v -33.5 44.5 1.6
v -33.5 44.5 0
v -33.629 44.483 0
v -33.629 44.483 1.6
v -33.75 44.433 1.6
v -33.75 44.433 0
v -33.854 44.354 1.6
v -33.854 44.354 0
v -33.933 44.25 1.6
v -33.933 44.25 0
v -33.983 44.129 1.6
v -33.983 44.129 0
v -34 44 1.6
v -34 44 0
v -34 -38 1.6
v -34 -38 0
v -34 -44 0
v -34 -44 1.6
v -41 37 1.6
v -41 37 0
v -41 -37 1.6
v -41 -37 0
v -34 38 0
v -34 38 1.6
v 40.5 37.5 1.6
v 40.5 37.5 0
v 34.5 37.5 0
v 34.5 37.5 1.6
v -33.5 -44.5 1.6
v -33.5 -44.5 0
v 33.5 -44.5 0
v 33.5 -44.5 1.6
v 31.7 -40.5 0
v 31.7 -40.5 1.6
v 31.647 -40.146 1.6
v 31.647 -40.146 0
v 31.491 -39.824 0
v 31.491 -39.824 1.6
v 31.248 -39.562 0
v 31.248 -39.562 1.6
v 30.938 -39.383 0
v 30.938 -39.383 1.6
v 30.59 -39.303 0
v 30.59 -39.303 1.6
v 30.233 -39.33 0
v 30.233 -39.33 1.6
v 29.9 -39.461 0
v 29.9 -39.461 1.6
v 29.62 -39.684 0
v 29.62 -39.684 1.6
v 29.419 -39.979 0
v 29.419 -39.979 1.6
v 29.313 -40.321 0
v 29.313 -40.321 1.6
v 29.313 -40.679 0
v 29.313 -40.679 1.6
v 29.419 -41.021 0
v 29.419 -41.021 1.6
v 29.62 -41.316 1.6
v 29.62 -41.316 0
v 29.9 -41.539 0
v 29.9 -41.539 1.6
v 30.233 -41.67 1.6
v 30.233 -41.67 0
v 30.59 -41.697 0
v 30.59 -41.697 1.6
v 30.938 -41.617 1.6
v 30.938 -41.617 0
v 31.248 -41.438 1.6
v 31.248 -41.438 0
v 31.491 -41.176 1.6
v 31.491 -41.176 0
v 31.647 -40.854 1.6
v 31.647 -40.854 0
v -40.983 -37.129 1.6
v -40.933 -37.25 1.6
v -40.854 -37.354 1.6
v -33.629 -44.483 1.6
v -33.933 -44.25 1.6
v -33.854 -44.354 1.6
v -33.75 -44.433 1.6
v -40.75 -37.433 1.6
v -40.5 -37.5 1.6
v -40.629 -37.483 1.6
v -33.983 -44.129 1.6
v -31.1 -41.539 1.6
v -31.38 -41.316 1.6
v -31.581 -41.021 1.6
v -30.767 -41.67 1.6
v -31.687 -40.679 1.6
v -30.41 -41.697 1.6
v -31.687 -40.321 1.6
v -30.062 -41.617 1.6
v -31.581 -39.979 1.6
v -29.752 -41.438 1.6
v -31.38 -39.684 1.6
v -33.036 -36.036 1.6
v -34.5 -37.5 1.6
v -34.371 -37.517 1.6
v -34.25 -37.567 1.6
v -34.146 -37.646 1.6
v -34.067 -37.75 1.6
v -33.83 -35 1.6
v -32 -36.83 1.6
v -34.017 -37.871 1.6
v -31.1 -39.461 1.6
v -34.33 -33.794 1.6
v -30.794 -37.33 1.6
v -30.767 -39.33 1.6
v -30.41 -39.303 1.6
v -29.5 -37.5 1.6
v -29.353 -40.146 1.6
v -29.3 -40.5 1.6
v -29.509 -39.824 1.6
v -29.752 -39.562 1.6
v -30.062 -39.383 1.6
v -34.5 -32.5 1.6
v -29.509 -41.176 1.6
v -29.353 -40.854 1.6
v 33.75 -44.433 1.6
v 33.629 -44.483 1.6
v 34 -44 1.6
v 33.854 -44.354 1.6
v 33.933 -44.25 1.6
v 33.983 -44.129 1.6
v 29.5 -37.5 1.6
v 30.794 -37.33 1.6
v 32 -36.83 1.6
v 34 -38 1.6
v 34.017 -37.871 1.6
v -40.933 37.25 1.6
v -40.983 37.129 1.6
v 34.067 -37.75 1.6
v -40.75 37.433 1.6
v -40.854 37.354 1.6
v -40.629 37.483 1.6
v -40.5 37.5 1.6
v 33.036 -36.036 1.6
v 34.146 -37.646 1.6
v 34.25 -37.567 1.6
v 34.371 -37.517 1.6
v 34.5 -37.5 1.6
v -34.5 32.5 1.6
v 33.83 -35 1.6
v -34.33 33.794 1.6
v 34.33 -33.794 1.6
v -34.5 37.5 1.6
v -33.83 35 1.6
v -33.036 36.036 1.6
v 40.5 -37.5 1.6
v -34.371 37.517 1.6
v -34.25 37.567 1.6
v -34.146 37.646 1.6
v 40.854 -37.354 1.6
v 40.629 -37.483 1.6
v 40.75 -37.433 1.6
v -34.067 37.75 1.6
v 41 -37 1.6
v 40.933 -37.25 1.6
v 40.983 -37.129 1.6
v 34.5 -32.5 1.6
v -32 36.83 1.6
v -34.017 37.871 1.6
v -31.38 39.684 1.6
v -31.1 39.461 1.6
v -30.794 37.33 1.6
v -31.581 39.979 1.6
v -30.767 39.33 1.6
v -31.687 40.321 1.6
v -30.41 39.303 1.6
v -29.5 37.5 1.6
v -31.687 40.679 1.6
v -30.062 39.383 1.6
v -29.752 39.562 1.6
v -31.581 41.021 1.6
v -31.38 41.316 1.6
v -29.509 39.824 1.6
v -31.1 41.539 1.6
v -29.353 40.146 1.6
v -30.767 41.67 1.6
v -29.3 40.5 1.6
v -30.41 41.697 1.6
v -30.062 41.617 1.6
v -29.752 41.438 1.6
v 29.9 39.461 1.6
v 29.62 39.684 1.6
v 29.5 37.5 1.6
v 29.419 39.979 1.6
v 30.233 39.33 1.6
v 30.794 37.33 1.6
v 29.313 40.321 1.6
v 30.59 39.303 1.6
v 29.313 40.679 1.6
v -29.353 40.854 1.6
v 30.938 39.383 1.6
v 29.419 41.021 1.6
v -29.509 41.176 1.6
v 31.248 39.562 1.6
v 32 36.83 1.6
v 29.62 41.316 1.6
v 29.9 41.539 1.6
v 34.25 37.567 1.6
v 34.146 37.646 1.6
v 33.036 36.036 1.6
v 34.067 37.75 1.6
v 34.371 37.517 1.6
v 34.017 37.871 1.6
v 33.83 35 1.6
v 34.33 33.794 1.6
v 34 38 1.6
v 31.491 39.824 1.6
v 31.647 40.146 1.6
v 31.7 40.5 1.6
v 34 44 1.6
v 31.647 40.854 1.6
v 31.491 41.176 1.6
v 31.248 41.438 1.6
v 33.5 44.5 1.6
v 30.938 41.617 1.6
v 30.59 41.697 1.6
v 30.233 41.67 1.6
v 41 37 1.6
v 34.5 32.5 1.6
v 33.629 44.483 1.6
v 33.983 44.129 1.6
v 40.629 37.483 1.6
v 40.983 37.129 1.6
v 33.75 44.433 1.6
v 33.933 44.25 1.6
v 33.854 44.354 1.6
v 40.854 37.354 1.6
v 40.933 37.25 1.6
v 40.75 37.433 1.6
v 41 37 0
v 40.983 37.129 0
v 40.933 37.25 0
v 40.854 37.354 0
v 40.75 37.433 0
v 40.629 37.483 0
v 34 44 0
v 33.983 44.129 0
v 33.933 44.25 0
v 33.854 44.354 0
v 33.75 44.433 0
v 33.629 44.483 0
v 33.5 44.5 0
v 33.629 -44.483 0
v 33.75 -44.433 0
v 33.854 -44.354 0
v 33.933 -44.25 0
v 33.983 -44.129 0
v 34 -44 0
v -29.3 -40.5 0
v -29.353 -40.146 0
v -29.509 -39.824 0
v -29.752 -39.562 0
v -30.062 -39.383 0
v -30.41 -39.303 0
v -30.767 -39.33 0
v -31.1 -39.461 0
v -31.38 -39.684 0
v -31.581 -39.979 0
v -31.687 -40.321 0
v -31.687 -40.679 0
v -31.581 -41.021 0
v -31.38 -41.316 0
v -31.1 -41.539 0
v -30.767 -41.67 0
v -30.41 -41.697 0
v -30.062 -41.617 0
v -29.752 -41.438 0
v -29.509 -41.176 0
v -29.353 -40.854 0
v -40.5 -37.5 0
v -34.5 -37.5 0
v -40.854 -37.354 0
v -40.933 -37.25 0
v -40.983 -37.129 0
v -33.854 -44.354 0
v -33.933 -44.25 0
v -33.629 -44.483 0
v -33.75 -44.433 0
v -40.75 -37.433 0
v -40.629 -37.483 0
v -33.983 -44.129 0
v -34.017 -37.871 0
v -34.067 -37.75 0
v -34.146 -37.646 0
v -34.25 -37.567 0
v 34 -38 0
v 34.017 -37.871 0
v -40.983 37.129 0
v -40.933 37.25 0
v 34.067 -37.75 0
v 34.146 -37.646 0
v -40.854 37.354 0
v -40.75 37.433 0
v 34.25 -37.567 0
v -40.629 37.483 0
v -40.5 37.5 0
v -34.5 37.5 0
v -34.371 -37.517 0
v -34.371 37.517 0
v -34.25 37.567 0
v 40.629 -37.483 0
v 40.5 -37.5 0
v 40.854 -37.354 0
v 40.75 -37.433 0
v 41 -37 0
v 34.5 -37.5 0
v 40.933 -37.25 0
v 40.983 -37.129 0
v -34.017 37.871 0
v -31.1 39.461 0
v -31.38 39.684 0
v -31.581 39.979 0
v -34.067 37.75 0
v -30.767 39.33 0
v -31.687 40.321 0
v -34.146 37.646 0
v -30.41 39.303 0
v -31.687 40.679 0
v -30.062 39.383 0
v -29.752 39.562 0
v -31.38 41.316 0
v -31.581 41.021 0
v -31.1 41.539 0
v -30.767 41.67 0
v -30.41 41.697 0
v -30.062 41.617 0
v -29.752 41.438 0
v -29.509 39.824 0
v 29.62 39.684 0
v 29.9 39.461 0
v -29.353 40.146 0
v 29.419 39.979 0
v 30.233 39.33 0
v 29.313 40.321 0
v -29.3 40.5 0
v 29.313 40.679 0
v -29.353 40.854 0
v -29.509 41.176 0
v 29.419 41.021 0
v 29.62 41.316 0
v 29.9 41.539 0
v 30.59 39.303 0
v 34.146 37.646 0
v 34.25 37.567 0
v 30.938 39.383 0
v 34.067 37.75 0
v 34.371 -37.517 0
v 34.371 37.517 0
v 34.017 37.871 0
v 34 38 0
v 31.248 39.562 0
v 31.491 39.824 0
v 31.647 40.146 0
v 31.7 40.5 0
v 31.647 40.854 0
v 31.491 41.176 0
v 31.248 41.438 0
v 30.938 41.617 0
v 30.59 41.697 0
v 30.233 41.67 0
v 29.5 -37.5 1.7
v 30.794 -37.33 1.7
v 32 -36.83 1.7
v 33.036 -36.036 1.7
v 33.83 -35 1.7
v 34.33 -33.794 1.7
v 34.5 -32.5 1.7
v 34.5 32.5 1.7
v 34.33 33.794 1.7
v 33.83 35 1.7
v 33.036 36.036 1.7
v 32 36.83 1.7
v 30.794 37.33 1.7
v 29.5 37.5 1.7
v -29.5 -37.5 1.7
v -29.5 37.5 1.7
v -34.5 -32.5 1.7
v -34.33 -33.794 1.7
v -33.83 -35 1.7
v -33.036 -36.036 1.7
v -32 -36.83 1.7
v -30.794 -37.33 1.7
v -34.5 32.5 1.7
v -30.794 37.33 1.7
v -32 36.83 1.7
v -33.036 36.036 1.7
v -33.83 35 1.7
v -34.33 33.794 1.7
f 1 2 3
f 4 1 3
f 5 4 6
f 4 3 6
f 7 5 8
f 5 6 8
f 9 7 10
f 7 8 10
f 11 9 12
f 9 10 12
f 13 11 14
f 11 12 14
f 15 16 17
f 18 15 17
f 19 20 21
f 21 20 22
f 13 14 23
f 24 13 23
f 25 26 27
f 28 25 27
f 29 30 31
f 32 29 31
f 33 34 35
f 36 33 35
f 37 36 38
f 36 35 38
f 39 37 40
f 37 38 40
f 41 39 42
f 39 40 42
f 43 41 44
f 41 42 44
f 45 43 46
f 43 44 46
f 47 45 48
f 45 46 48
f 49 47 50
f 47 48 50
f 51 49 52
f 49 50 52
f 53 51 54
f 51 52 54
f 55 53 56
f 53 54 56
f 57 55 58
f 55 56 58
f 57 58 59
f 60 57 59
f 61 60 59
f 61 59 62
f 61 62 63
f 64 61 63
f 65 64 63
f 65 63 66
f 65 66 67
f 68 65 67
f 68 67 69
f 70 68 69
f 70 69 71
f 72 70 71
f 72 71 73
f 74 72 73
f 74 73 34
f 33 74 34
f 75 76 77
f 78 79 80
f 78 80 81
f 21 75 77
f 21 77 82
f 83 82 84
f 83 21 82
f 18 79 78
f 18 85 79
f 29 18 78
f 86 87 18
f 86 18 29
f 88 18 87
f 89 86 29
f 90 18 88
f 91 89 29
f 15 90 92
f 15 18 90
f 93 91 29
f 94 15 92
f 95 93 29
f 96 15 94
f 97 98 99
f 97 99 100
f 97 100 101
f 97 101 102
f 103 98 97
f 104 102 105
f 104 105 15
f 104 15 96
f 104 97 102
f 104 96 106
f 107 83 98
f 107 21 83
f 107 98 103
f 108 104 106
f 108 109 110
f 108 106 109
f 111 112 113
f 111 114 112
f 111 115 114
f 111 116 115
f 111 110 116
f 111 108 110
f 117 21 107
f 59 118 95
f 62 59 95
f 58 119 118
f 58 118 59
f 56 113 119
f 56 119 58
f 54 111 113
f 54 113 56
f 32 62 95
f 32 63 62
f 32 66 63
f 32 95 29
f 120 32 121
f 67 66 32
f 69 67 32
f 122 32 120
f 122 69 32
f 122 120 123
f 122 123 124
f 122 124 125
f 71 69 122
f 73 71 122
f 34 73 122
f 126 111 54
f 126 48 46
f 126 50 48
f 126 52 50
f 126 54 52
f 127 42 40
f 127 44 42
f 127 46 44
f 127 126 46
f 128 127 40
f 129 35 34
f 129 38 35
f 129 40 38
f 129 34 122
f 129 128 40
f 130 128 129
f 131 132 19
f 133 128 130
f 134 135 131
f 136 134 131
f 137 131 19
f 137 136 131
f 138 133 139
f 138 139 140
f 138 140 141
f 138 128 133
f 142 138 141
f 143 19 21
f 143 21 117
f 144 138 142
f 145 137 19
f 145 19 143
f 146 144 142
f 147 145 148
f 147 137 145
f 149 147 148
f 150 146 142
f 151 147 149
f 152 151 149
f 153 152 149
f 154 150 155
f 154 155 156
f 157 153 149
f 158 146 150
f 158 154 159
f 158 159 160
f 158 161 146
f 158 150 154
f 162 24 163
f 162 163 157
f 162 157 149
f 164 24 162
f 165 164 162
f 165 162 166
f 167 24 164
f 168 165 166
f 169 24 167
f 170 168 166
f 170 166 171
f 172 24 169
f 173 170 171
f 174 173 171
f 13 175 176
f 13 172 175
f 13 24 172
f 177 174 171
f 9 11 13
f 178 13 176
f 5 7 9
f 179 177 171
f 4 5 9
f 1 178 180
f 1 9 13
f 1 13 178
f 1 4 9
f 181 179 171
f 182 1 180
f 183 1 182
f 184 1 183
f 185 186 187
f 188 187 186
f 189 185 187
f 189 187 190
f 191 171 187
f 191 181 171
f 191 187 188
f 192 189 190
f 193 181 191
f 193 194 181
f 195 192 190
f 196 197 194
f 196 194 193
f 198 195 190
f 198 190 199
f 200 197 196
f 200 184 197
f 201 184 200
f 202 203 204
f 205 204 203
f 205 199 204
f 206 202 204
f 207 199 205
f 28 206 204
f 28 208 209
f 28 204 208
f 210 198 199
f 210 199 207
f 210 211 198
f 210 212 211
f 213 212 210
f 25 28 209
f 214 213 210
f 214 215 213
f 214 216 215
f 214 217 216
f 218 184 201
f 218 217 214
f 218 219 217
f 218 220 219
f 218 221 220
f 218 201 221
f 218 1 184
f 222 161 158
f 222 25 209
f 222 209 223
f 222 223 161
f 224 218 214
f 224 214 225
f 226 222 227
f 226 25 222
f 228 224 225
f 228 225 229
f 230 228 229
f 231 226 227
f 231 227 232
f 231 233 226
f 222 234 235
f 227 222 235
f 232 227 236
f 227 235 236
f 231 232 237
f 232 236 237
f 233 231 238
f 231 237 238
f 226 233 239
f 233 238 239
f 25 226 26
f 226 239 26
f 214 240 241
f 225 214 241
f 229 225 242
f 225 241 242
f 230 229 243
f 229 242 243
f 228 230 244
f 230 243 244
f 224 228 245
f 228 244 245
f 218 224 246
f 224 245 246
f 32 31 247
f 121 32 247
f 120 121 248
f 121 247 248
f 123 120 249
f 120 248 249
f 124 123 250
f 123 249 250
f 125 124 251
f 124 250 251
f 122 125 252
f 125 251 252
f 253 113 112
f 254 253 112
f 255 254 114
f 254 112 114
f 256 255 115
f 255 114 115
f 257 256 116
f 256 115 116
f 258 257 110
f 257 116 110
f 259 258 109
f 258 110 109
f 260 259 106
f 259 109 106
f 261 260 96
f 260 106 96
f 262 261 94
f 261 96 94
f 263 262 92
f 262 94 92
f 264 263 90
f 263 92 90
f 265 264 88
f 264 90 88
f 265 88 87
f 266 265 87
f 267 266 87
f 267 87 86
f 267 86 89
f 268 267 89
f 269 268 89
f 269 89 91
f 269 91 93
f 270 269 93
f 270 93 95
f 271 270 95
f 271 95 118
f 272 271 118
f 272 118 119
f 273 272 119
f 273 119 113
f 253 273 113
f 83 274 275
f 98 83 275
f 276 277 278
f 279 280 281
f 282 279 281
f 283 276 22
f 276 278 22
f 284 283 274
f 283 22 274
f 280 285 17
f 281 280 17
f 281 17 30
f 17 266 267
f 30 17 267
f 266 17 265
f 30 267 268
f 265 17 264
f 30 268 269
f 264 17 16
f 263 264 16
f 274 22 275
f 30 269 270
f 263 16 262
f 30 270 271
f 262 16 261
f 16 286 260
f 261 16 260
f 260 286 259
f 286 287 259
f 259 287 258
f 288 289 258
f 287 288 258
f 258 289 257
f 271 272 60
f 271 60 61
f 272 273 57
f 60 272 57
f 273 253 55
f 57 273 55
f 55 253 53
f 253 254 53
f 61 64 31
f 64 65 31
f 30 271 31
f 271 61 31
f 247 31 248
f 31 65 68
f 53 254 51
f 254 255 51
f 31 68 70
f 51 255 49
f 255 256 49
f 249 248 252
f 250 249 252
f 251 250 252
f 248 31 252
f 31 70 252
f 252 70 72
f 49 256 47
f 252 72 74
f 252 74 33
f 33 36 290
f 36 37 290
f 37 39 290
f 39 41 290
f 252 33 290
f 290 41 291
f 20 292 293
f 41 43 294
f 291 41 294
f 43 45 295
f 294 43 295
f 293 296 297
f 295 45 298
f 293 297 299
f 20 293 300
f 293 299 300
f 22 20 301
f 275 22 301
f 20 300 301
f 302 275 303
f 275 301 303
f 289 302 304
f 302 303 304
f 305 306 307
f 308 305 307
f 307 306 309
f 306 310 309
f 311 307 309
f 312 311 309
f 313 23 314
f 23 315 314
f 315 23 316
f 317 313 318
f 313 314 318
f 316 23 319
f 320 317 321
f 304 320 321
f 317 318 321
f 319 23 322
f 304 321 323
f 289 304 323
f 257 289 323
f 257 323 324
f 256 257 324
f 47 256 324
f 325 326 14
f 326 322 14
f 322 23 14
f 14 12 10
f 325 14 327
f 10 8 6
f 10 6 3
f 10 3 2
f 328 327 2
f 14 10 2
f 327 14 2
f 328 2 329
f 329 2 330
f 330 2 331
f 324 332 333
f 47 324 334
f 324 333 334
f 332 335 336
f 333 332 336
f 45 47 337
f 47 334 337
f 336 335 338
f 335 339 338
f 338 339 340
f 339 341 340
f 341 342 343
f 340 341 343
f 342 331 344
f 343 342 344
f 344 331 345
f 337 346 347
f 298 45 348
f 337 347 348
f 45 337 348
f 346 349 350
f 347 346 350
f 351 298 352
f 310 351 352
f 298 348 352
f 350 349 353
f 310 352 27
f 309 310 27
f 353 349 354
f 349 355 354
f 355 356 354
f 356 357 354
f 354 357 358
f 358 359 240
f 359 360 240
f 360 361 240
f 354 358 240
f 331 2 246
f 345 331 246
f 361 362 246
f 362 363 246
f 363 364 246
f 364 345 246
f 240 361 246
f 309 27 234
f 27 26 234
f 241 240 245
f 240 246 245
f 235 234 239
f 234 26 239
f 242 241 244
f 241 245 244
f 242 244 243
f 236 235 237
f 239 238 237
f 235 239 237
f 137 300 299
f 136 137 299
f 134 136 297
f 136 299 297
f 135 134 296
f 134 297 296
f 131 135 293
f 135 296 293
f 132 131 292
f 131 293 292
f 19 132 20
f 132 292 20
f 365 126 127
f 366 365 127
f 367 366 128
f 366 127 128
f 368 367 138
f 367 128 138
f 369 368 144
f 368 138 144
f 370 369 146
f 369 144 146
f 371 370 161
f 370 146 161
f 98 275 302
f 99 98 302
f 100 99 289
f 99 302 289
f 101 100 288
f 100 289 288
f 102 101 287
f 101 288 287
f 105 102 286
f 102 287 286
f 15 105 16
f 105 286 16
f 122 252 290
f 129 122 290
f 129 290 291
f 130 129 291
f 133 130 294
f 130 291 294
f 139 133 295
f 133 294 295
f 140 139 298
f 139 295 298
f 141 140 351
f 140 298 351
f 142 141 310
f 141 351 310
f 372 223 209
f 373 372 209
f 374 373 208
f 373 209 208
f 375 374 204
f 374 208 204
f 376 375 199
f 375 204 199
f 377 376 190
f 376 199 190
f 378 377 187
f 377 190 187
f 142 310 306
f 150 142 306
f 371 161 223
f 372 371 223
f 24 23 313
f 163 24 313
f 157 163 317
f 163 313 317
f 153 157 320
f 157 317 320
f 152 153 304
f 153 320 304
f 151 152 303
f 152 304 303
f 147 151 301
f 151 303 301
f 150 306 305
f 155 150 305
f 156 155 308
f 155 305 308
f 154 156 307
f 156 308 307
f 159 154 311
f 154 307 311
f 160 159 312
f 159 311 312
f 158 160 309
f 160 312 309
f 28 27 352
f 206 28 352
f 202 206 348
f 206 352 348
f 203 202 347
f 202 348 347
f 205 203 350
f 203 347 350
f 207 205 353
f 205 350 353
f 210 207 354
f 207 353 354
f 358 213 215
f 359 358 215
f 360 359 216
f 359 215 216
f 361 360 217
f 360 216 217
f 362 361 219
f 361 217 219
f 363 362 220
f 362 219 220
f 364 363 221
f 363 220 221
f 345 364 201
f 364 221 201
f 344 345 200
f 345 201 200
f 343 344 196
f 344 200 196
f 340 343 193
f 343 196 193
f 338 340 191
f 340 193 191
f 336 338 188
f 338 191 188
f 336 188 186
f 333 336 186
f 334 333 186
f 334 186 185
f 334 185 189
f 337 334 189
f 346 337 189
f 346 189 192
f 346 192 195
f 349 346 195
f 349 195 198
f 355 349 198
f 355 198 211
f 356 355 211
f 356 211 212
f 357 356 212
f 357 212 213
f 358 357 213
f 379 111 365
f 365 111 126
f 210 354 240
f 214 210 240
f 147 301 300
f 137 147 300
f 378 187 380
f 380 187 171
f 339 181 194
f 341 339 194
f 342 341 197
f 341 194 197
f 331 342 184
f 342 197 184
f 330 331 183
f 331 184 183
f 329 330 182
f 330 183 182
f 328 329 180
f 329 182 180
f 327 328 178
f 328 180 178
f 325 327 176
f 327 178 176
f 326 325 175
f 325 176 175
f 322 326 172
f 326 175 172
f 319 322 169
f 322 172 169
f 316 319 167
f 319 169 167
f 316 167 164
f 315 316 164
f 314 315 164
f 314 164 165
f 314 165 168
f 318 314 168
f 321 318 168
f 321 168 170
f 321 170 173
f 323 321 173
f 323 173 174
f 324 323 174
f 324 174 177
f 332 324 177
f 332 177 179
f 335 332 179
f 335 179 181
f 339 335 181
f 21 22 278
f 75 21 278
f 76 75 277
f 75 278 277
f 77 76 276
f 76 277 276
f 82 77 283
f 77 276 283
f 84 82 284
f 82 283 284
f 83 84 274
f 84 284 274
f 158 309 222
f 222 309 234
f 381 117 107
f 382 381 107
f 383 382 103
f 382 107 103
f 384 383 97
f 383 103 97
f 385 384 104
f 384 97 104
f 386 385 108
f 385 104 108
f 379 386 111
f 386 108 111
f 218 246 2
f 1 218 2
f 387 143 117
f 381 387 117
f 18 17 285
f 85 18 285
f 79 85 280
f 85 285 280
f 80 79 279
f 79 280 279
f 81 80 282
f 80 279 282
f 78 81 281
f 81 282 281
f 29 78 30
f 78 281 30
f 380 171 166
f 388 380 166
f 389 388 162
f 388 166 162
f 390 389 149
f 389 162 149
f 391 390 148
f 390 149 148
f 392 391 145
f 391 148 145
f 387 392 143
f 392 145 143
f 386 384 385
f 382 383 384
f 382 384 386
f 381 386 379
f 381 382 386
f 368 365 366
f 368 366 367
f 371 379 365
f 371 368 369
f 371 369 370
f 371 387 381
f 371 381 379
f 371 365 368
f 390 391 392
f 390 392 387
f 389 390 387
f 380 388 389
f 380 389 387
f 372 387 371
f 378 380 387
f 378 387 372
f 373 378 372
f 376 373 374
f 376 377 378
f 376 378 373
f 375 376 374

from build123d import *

# Parameters (mm, degrees)
BOSS_EXTRUDE1_DEPTH            = 1.6
BOSS_EXTRUDE2_DEPTH            = 0.1
M2_HOLE1_FIXINGSTRUCTURE_D     = 2.4
M2_HOLE1_FIXINGSTRUCTURE_DEPTH = 200
M2_HOLE1_FIXINGSTRUCTURE_TIP   = 0.721032743


with BuildPart() as part:
    # Sketch1 → Boss-Extrude1 (new body)
    with BuildSketch(Plane.XY):
        with BuildLine():
            Line((-34, 44), (-34, 38))
            ThreePointArc((-34, 38), (-34.146446609, 37.646446609), (-34.5, 37.5))
            Line((-34.5, 37.5), (-40.5, 37.5))
            ThreePointArc((-40.5, 37.5), (-40.853553391, 37.353553391), (-41, 37))
            Line((-41, 37), (-41, -37))
            ThreePointArc((-41, -37), (-40.853553391, -37.353553391), (-40.5, -37.5))
            Line((-40.5, -37.5), (-34.5, -37.5))
            ThreePointArc((-34.5, -37.5), (-34.146446609, -37.646446609), (-34, -38))
            Line((-34, -38), (-34, -44))
            ThreePointArc((-34, -44), (-33.853553391, -44.353553391), (-33.5, -44.5))
            Line((-33.5, -44.5), (33.5, -44.5))
            ThreePointArc((33.5, -44.5), (33.853553391, -44.353553391), (34, -44))
            Line((34, -44), (34, -38))
            ThreePointArc((34, -38), (34.146446609, -37.646446609), (34.5, -37.5))
            Line((34.5, -37.5), (40.5, -37.5))
            ThreePointArc((40.5, -37.5), (40.853553391, -37.353553391), (41, -37))
            Line((41, -37), (41, 37))
            ThreePointArc((41, 37), (40.853553391, 37.353553391), (40.5, 37.5))
            Line((40.5, 37.5), (34.5, 37.5))
            ThreePointArc((34.5, 37.5), (34.146446609, 37.646446609), (34, 38))
            Line((34, 38), (34, 44))
            ThreePointArc((34, 44), (33.853553391, 44.353553391), (33.5, 44.5))
            Line((33.5, 44.5), (-33.5, 44.5))
            ThreePointArc((-33.5, 44.5), (-33.853553391, 44.353553391), (-34, 44))
        make_face()
    extrude(amount=BOSS_EXTRUDE1_DEPTH)

    # Esboço1 → Boss-Extrude2 (add)
    with BuildSketch(Plane.XY.offset(1.6)):
        with BuildLine():
            Line((-29.5, -37.5), (29.5, -37.5))
            ThreePointArc((29.5, -37.5), (33.035533906, -36.035533906), (34.5, -32.5))
            Line((34.5, -32.5), (34.5, 32.5))
            ThreePointArc((34.5, 32.5), (33.035533906, 36.035533906), (29.5, 37.5))
            Line((29.5, 37.5), (-29.5, 37.5))
            ThreePointArc((-29.5, 37.5), (-33.035533906, 36.035533906), (-34.5, 32.5))
            Line((-34.5, 32.5), (-34.5, -32.5))
            ThreePointArc((-34.5, -32.5), (-33.035533906, -36.035533906), (-29.5, -37.5))
        make_face()
    extrude(amount=BOSS_EXTRUDE2_DEPTH)

    # M2 Hole1-FixingStructure
    with Locations(Plane(origin=(0, 0, 0), x_dir=(-1, 0, 0), z_dir=(0, 0, -1))):
        with Locations((-30.5, 40.5), (30.5, 40.5), (-30.5, -40.5), (30.5, -40.5)):
            Hole(M2_HOLE1_FIXINGSTRUCTURE_D / 2, depth=M2_HOLE1_FIXINGSTRUCTURE_DEPTH)
            with Locations((0, 0, -(M2_HOLE1_FIXINGSTRUCTURE_DEPTH + M2_HOLE1_FIXINGSTRUCTURE_TIP / 2))):  # 118° drill point
                Cone(0, M2_HOLE1_FIXINGSTRUCTURE_D / 2, M2_HOLE1_FIXINGSTRUCTURE_TIP, mode=Mode.SUBTRACT)


solid = part.part
